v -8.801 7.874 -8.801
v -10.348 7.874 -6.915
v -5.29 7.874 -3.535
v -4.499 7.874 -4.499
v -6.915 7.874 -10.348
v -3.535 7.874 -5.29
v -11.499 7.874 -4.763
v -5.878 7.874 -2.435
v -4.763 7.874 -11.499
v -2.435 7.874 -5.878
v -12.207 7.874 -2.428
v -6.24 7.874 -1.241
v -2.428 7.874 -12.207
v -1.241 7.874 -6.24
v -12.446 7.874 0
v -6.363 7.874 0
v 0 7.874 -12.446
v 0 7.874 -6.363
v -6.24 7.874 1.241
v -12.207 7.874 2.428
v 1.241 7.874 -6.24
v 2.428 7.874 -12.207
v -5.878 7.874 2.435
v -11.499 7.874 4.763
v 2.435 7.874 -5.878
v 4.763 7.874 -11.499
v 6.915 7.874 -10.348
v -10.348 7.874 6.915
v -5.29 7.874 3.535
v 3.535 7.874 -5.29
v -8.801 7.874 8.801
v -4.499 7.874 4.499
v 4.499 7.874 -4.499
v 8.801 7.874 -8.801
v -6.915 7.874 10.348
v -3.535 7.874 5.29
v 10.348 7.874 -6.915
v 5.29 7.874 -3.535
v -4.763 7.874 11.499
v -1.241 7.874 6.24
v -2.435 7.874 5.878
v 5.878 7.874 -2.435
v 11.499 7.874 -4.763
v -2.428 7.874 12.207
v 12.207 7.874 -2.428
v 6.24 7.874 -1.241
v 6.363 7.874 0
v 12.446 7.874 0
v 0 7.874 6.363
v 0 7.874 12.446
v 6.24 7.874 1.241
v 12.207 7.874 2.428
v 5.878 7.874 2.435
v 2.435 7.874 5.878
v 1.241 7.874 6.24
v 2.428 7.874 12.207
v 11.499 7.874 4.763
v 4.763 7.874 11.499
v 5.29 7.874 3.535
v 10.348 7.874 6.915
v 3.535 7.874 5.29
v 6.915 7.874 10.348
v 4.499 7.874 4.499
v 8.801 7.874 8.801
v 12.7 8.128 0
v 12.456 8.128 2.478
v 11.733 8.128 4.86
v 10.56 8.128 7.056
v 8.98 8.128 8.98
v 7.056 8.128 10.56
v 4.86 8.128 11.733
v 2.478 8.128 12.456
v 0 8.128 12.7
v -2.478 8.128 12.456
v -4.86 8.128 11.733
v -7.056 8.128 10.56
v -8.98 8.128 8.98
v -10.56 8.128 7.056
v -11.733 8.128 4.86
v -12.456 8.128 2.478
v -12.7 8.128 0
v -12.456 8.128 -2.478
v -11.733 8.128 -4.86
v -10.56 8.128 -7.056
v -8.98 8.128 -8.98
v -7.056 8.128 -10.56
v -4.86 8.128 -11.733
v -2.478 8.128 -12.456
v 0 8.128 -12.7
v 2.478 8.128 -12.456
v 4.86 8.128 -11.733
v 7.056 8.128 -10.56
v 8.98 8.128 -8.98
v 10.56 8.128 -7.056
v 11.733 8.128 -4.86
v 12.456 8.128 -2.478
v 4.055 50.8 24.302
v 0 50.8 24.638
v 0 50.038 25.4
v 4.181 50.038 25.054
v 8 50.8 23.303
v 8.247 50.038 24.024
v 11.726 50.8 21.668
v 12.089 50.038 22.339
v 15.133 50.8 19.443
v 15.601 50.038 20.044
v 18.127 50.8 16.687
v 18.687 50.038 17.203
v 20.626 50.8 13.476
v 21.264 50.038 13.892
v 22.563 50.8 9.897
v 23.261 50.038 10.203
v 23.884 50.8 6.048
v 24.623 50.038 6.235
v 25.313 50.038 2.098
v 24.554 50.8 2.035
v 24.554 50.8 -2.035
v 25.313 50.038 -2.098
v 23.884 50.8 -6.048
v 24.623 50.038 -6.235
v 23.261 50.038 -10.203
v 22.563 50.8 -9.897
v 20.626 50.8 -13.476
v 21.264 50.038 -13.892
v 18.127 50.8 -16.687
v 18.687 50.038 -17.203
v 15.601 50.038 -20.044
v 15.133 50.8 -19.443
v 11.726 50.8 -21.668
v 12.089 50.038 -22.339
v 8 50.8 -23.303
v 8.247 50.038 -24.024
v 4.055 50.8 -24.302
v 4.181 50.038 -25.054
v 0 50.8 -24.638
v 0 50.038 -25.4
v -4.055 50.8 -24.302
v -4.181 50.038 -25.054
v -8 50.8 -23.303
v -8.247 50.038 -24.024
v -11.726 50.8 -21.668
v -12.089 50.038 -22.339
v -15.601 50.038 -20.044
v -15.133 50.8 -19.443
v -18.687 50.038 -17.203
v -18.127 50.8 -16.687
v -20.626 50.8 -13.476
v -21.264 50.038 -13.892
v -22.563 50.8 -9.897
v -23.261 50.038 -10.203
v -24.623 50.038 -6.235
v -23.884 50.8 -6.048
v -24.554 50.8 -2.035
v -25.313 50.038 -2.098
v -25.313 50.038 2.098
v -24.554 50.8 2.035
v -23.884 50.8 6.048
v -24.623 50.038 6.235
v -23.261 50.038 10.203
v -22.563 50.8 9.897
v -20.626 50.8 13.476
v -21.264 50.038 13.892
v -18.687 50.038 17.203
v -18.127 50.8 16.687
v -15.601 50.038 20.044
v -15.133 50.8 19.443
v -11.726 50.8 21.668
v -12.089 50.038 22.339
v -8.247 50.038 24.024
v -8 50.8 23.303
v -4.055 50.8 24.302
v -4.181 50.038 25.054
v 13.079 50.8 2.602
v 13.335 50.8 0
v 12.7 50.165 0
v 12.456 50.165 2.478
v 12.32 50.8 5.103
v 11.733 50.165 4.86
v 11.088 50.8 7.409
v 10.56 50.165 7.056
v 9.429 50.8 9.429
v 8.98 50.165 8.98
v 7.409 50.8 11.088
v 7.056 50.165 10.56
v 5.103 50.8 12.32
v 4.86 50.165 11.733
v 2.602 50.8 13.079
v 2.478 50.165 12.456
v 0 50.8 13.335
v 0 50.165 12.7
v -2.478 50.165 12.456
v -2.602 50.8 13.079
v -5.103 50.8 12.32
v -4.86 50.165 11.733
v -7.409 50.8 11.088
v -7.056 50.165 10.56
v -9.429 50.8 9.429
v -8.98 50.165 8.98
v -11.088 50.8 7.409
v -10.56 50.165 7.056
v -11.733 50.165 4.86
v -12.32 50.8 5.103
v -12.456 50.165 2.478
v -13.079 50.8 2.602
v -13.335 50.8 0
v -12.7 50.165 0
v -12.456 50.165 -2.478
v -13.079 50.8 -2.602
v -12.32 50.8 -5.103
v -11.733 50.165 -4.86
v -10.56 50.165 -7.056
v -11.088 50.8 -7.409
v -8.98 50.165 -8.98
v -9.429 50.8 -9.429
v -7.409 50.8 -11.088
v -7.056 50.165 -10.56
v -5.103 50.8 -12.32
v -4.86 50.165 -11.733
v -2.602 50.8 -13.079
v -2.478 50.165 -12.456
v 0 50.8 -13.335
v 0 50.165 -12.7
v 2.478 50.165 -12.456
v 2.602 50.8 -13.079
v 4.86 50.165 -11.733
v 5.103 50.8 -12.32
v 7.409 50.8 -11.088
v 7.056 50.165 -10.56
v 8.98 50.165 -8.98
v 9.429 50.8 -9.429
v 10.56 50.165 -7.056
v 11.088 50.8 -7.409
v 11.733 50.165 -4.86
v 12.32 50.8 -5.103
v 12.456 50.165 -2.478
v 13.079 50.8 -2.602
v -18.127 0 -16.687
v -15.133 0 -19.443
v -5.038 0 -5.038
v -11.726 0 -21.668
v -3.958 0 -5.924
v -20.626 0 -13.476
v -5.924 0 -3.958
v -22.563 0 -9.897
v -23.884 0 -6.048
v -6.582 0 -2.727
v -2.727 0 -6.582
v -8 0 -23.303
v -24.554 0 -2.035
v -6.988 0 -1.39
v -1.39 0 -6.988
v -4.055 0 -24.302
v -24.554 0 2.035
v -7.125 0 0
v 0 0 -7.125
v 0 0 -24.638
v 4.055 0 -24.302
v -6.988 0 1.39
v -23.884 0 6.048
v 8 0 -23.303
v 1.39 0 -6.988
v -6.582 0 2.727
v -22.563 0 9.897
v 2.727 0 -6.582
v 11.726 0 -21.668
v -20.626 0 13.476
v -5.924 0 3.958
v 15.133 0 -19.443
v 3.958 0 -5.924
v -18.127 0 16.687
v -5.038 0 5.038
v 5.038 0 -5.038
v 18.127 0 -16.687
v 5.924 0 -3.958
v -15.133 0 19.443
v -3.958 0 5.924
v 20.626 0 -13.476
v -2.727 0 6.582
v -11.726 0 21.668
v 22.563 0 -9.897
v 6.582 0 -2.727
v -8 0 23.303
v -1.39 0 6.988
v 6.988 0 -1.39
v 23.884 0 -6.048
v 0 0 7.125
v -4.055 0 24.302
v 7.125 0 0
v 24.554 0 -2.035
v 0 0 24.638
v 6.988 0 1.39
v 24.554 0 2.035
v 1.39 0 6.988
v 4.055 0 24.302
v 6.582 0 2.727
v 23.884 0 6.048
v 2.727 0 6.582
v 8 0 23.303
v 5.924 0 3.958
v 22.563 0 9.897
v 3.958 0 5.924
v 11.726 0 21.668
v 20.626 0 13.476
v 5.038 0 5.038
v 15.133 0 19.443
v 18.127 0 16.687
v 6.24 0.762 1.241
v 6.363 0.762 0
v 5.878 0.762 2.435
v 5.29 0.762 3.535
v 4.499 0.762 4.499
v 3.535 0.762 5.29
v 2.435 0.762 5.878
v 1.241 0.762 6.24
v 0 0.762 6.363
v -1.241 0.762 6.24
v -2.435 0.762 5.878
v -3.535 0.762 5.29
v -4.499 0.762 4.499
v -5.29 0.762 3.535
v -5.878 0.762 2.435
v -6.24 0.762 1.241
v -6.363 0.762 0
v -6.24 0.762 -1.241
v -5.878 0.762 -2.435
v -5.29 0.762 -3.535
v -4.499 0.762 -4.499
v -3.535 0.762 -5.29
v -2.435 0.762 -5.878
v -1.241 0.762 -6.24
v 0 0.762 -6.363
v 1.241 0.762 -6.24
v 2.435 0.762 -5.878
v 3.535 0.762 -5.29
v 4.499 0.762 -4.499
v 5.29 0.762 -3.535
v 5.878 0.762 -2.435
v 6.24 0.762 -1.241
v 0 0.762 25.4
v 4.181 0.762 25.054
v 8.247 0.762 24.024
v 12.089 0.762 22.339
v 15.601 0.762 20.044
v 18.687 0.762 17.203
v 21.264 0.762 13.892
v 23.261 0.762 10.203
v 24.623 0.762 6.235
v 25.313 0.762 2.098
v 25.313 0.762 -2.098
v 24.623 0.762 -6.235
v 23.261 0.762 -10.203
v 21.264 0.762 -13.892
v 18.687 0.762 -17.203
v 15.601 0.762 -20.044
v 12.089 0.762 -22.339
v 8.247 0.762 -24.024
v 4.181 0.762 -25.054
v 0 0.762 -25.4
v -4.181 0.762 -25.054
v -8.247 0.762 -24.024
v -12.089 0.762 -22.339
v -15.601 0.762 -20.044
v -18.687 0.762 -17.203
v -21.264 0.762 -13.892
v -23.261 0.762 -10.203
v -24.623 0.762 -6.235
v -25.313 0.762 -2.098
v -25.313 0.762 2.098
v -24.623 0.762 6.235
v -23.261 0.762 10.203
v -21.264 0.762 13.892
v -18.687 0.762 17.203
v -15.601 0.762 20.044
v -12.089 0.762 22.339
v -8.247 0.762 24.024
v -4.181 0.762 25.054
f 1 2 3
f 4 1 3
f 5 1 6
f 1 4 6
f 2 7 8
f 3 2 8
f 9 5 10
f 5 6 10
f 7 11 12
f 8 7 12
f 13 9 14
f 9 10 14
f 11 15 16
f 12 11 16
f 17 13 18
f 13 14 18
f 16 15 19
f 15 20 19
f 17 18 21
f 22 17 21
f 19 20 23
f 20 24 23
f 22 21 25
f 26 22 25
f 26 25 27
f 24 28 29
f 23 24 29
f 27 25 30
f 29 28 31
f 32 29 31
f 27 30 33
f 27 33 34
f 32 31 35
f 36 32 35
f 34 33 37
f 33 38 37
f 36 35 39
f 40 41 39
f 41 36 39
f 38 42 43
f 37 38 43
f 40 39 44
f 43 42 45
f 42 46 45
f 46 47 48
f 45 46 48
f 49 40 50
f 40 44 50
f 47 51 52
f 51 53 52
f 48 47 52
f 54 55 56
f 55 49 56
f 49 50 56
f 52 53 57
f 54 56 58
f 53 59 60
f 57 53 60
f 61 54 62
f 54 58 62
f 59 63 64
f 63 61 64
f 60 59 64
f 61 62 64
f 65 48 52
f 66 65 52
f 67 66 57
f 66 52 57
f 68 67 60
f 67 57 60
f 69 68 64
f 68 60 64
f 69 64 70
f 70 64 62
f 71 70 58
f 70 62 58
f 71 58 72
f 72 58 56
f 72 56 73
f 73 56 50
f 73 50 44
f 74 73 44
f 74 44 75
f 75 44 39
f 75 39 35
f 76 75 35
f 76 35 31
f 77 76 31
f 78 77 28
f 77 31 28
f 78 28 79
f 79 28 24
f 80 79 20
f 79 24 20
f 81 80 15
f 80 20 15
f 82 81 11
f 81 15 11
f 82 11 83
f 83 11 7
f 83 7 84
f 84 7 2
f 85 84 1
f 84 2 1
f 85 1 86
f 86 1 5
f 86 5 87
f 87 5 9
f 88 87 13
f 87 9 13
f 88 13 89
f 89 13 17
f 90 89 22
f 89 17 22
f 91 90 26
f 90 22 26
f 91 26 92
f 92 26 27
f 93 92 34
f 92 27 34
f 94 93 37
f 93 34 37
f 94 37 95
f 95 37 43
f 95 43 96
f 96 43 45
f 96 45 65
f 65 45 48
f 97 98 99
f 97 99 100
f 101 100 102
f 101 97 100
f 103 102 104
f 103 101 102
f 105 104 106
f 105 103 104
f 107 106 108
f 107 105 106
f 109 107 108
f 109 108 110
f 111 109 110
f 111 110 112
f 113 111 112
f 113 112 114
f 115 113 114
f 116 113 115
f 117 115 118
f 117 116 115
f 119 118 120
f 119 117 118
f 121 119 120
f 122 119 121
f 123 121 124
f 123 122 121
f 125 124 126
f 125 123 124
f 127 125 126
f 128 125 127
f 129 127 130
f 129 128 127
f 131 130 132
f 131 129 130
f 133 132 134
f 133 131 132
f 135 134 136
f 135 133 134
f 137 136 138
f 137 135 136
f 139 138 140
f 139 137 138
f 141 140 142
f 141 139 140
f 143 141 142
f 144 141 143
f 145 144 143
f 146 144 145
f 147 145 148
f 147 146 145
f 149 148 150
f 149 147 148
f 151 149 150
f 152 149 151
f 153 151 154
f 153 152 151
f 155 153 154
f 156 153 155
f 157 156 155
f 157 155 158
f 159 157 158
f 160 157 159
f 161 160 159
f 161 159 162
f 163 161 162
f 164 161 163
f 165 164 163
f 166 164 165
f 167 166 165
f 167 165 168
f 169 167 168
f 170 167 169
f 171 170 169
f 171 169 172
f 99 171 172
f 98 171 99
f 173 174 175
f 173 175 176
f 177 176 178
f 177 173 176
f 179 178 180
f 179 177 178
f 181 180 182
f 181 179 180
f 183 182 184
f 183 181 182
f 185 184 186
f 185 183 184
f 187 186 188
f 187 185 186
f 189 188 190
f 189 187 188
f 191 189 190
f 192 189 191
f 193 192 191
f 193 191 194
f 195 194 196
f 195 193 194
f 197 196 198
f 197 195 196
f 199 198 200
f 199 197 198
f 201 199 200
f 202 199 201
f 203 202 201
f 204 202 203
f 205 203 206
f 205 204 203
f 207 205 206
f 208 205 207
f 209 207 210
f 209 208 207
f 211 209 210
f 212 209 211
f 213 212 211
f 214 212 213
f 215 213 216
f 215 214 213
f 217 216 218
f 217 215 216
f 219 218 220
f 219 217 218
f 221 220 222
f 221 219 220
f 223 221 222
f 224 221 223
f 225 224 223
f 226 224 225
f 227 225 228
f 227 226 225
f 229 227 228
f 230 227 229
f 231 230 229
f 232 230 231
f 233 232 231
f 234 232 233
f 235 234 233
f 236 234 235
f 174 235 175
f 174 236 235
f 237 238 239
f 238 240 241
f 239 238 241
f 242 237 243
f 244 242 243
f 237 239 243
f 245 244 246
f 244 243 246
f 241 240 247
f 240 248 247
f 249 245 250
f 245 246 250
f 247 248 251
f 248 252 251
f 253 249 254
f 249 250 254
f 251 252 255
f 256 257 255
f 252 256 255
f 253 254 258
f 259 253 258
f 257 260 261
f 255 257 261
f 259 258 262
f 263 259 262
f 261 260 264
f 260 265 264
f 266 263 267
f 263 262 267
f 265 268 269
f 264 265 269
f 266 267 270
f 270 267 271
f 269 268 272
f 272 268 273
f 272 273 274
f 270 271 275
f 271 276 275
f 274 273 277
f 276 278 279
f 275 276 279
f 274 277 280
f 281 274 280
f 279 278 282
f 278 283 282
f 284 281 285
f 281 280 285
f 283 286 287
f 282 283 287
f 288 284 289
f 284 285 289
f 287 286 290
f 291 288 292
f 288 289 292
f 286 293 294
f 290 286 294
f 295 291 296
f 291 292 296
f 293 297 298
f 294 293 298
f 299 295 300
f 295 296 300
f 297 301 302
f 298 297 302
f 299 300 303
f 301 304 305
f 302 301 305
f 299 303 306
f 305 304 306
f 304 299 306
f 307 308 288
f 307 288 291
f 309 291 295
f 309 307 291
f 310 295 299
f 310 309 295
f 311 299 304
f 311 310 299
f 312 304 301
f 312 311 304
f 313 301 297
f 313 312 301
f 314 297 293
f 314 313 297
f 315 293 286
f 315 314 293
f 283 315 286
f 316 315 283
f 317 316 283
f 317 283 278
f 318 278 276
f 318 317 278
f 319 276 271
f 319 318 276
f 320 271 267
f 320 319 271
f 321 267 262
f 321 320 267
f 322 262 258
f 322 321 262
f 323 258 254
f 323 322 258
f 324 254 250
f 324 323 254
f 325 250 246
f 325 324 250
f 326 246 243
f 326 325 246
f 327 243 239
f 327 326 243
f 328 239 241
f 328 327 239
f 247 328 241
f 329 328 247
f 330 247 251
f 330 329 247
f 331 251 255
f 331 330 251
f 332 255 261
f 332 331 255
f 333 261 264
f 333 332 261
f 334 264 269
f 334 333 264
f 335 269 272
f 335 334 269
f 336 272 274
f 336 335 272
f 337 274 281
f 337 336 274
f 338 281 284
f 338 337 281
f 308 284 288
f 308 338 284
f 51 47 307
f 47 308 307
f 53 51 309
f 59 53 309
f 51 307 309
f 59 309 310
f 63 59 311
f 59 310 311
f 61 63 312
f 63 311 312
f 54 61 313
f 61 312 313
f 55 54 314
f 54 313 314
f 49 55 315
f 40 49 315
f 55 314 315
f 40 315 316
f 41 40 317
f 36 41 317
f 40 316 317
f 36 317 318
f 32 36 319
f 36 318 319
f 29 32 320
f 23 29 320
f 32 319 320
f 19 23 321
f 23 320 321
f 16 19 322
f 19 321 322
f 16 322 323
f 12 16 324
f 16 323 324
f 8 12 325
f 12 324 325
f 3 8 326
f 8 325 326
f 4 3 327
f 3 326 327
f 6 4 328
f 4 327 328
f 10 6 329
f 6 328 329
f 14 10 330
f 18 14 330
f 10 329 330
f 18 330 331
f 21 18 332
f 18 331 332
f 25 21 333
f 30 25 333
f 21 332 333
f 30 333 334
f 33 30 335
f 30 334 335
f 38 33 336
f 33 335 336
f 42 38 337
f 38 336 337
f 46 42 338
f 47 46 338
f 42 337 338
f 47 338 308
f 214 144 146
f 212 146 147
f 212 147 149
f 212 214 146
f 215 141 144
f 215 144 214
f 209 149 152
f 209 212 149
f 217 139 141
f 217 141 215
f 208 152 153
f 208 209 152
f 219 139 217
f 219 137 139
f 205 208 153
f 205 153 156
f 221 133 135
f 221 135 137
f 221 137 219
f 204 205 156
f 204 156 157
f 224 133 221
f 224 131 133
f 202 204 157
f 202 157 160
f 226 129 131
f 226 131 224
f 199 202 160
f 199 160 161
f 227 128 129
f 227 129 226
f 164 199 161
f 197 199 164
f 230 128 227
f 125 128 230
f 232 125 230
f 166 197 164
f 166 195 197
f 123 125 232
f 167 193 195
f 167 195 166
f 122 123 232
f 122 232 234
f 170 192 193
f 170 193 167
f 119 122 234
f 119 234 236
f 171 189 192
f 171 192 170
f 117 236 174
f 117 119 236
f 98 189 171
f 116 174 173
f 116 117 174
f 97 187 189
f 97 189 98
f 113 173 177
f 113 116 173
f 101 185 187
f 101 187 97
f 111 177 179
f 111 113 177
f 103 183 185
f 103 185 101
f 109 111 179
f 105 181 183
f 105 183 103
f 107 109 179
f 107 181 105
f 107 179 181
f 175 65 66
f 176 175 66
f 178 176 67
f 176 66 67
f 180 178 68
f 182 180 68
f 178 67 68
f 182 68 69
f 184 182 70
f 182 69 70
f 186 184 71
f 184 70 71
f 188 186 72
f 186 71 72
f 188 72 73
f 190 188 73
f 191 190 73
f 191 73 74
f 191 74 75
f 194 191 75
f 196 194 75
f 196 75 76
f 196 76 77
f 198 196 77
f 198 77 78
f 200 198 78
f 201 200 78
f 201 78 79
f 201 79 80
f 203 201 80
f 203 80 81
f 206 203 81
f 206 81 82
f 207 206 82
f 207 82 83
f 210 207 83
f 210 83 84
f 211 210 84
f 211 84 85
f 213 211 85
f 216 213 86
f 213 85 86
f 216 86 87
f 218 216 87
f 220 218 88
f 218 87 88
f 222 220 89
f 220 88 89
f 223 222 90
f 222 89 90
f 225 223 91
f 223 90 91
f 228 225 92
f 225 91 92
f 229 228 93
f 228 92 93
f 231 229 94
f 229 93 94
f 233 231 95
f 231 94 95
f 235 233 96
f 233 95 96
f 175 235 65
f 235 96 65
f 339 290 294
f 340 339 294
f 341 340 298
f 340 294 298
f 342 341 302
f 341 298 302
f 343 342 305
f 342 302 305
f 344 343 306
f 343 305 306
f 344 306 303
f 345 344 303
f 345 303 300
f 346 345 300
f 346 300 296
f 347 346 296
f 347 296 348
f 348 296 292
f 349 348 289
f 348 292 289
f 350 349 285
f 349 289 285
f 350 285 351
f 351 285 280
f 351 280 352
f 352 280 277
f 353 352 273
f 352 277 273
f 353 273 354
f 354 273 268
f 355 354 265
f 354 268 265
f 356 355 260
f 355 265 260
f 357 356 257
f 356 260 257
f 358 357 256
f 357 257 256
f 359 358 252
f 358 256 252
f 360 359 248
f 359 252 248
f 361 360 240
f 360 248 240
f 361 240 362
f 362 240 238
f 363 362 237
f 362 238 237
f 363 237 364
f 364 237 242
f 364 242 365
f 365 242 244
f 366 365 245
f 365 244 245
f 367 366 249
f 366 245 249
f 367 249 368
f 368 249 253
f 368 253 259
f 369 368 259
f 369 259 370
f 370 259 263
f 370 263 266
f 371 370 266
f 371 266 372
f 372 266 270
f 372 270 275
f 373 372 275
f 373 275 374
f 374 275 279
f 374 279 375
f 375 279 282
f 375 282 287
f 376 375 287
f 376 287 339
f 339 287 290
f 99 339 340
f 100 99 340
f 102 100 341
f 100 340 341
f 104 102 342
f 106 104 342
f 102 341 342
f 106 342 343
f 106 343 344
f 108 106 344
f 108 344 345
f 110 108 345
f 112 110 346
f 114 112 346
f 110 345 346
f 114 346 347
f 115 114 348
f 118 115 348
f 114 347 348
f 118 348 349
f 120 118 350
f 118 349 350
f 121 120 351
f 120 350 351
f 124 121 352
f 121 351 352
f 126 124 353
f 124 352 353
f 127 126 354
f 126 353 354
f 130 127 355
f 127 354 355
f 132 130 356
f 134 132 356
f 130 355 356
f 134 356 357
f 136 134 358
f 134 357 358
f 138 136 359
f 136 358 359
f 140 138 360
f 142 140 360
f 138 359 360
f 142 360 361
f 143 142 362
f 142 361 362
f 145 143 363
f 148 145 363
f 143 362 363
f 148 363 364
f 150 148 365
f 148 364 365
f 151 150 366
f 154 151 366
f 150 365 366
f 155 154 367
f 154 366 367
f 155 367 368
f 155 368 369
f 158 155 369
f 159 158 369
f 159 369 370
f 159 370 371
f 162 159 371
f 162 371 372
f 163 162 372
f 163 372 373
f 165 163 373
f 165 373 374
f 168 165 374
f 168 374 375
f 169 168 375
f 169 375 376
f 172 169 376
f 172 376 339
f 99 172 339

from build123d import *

# Parameters (mm, degrees)
SKETCH1_R                  = 25.4
EXTRUDE1_DEPTH             = 50.8
F_1_2_0_5_DIAMETER_HOLE1_D = 12.7254
CHAMFER1_SIZE              = 0.762
F_1_1_DIAMETER_HOLE1_D     = 25.4
F_1_1_DIAMETER_HOLE1_DEPTH = 42.926
CHAMFER2_SIZE              = 0.254
CHAMFER3_SIZE              = 0.635


with BuildPart() as part:
    # Sketch1 → Extrude1 (new body)
    with BuildSketch(Plane(origin=(0, 0, 0), x_dir=(1, 0, 0), z_dir=(0, 1, 0))):
        with Locations(Location((0, 0, 0), (0, 0, 270))):  # turned: the seam where the file's is
            Circle(SKETCH1_R)
    extrude(amount=EXTRUDE1_DEPTH)

    # 1/2 (0.5) Diameter Hole1 (through all)
    with Locations(Plane(origin=(0, 50.8, 0), x_dir=(-1, 0, 0), z_dir=(0, 1, 0))):
        with Locations((0, 0)):
            Hole(F_1_2_0_5_DIAMETER_HOLE1_D / 2)

    # Chamfer1
    chamfer1_edges = [part.edges().sort_by_distance(p)[0] for p in [
        (0, 0, -25.4),
        (0, 50.8, -25.4),
        (-6.3627, 0, 0),
    ]]
    chamfer(chamfer1_edges, length=CHAMFER1_SIZE)

    # 1 (1) Diameter Hole1
    with Locations(Plane(origin=(0, 50.8, 0), x_dir=(-1, 0, 0), z_dir=(0, 1, 0))):
        with Locations((0, 0)):
            Hole(F_1_1_DIAMETER_HOLE1_D / 2, depth=F_1_1_DIAMETER_HOLE1_DEPTH)

    # Chamfer2
    chamfer2_edges = [part.edges().sort_by_distance(p)[0] for p in [
        (-12.7, 7.874, 0),
    ]]
    chamfer(chamfer2_edges, length=CHAMFER2_SIZE)

    # Chamfer3
    chamfer3_edges = [part.edges().sort_by_distance(p)[0] for p in [
        (-12.7, 50.8, 0),
    ]]
    chamfer(chamfer3_edges, length=CHAMFER3_SIZE)


solid = part.part
